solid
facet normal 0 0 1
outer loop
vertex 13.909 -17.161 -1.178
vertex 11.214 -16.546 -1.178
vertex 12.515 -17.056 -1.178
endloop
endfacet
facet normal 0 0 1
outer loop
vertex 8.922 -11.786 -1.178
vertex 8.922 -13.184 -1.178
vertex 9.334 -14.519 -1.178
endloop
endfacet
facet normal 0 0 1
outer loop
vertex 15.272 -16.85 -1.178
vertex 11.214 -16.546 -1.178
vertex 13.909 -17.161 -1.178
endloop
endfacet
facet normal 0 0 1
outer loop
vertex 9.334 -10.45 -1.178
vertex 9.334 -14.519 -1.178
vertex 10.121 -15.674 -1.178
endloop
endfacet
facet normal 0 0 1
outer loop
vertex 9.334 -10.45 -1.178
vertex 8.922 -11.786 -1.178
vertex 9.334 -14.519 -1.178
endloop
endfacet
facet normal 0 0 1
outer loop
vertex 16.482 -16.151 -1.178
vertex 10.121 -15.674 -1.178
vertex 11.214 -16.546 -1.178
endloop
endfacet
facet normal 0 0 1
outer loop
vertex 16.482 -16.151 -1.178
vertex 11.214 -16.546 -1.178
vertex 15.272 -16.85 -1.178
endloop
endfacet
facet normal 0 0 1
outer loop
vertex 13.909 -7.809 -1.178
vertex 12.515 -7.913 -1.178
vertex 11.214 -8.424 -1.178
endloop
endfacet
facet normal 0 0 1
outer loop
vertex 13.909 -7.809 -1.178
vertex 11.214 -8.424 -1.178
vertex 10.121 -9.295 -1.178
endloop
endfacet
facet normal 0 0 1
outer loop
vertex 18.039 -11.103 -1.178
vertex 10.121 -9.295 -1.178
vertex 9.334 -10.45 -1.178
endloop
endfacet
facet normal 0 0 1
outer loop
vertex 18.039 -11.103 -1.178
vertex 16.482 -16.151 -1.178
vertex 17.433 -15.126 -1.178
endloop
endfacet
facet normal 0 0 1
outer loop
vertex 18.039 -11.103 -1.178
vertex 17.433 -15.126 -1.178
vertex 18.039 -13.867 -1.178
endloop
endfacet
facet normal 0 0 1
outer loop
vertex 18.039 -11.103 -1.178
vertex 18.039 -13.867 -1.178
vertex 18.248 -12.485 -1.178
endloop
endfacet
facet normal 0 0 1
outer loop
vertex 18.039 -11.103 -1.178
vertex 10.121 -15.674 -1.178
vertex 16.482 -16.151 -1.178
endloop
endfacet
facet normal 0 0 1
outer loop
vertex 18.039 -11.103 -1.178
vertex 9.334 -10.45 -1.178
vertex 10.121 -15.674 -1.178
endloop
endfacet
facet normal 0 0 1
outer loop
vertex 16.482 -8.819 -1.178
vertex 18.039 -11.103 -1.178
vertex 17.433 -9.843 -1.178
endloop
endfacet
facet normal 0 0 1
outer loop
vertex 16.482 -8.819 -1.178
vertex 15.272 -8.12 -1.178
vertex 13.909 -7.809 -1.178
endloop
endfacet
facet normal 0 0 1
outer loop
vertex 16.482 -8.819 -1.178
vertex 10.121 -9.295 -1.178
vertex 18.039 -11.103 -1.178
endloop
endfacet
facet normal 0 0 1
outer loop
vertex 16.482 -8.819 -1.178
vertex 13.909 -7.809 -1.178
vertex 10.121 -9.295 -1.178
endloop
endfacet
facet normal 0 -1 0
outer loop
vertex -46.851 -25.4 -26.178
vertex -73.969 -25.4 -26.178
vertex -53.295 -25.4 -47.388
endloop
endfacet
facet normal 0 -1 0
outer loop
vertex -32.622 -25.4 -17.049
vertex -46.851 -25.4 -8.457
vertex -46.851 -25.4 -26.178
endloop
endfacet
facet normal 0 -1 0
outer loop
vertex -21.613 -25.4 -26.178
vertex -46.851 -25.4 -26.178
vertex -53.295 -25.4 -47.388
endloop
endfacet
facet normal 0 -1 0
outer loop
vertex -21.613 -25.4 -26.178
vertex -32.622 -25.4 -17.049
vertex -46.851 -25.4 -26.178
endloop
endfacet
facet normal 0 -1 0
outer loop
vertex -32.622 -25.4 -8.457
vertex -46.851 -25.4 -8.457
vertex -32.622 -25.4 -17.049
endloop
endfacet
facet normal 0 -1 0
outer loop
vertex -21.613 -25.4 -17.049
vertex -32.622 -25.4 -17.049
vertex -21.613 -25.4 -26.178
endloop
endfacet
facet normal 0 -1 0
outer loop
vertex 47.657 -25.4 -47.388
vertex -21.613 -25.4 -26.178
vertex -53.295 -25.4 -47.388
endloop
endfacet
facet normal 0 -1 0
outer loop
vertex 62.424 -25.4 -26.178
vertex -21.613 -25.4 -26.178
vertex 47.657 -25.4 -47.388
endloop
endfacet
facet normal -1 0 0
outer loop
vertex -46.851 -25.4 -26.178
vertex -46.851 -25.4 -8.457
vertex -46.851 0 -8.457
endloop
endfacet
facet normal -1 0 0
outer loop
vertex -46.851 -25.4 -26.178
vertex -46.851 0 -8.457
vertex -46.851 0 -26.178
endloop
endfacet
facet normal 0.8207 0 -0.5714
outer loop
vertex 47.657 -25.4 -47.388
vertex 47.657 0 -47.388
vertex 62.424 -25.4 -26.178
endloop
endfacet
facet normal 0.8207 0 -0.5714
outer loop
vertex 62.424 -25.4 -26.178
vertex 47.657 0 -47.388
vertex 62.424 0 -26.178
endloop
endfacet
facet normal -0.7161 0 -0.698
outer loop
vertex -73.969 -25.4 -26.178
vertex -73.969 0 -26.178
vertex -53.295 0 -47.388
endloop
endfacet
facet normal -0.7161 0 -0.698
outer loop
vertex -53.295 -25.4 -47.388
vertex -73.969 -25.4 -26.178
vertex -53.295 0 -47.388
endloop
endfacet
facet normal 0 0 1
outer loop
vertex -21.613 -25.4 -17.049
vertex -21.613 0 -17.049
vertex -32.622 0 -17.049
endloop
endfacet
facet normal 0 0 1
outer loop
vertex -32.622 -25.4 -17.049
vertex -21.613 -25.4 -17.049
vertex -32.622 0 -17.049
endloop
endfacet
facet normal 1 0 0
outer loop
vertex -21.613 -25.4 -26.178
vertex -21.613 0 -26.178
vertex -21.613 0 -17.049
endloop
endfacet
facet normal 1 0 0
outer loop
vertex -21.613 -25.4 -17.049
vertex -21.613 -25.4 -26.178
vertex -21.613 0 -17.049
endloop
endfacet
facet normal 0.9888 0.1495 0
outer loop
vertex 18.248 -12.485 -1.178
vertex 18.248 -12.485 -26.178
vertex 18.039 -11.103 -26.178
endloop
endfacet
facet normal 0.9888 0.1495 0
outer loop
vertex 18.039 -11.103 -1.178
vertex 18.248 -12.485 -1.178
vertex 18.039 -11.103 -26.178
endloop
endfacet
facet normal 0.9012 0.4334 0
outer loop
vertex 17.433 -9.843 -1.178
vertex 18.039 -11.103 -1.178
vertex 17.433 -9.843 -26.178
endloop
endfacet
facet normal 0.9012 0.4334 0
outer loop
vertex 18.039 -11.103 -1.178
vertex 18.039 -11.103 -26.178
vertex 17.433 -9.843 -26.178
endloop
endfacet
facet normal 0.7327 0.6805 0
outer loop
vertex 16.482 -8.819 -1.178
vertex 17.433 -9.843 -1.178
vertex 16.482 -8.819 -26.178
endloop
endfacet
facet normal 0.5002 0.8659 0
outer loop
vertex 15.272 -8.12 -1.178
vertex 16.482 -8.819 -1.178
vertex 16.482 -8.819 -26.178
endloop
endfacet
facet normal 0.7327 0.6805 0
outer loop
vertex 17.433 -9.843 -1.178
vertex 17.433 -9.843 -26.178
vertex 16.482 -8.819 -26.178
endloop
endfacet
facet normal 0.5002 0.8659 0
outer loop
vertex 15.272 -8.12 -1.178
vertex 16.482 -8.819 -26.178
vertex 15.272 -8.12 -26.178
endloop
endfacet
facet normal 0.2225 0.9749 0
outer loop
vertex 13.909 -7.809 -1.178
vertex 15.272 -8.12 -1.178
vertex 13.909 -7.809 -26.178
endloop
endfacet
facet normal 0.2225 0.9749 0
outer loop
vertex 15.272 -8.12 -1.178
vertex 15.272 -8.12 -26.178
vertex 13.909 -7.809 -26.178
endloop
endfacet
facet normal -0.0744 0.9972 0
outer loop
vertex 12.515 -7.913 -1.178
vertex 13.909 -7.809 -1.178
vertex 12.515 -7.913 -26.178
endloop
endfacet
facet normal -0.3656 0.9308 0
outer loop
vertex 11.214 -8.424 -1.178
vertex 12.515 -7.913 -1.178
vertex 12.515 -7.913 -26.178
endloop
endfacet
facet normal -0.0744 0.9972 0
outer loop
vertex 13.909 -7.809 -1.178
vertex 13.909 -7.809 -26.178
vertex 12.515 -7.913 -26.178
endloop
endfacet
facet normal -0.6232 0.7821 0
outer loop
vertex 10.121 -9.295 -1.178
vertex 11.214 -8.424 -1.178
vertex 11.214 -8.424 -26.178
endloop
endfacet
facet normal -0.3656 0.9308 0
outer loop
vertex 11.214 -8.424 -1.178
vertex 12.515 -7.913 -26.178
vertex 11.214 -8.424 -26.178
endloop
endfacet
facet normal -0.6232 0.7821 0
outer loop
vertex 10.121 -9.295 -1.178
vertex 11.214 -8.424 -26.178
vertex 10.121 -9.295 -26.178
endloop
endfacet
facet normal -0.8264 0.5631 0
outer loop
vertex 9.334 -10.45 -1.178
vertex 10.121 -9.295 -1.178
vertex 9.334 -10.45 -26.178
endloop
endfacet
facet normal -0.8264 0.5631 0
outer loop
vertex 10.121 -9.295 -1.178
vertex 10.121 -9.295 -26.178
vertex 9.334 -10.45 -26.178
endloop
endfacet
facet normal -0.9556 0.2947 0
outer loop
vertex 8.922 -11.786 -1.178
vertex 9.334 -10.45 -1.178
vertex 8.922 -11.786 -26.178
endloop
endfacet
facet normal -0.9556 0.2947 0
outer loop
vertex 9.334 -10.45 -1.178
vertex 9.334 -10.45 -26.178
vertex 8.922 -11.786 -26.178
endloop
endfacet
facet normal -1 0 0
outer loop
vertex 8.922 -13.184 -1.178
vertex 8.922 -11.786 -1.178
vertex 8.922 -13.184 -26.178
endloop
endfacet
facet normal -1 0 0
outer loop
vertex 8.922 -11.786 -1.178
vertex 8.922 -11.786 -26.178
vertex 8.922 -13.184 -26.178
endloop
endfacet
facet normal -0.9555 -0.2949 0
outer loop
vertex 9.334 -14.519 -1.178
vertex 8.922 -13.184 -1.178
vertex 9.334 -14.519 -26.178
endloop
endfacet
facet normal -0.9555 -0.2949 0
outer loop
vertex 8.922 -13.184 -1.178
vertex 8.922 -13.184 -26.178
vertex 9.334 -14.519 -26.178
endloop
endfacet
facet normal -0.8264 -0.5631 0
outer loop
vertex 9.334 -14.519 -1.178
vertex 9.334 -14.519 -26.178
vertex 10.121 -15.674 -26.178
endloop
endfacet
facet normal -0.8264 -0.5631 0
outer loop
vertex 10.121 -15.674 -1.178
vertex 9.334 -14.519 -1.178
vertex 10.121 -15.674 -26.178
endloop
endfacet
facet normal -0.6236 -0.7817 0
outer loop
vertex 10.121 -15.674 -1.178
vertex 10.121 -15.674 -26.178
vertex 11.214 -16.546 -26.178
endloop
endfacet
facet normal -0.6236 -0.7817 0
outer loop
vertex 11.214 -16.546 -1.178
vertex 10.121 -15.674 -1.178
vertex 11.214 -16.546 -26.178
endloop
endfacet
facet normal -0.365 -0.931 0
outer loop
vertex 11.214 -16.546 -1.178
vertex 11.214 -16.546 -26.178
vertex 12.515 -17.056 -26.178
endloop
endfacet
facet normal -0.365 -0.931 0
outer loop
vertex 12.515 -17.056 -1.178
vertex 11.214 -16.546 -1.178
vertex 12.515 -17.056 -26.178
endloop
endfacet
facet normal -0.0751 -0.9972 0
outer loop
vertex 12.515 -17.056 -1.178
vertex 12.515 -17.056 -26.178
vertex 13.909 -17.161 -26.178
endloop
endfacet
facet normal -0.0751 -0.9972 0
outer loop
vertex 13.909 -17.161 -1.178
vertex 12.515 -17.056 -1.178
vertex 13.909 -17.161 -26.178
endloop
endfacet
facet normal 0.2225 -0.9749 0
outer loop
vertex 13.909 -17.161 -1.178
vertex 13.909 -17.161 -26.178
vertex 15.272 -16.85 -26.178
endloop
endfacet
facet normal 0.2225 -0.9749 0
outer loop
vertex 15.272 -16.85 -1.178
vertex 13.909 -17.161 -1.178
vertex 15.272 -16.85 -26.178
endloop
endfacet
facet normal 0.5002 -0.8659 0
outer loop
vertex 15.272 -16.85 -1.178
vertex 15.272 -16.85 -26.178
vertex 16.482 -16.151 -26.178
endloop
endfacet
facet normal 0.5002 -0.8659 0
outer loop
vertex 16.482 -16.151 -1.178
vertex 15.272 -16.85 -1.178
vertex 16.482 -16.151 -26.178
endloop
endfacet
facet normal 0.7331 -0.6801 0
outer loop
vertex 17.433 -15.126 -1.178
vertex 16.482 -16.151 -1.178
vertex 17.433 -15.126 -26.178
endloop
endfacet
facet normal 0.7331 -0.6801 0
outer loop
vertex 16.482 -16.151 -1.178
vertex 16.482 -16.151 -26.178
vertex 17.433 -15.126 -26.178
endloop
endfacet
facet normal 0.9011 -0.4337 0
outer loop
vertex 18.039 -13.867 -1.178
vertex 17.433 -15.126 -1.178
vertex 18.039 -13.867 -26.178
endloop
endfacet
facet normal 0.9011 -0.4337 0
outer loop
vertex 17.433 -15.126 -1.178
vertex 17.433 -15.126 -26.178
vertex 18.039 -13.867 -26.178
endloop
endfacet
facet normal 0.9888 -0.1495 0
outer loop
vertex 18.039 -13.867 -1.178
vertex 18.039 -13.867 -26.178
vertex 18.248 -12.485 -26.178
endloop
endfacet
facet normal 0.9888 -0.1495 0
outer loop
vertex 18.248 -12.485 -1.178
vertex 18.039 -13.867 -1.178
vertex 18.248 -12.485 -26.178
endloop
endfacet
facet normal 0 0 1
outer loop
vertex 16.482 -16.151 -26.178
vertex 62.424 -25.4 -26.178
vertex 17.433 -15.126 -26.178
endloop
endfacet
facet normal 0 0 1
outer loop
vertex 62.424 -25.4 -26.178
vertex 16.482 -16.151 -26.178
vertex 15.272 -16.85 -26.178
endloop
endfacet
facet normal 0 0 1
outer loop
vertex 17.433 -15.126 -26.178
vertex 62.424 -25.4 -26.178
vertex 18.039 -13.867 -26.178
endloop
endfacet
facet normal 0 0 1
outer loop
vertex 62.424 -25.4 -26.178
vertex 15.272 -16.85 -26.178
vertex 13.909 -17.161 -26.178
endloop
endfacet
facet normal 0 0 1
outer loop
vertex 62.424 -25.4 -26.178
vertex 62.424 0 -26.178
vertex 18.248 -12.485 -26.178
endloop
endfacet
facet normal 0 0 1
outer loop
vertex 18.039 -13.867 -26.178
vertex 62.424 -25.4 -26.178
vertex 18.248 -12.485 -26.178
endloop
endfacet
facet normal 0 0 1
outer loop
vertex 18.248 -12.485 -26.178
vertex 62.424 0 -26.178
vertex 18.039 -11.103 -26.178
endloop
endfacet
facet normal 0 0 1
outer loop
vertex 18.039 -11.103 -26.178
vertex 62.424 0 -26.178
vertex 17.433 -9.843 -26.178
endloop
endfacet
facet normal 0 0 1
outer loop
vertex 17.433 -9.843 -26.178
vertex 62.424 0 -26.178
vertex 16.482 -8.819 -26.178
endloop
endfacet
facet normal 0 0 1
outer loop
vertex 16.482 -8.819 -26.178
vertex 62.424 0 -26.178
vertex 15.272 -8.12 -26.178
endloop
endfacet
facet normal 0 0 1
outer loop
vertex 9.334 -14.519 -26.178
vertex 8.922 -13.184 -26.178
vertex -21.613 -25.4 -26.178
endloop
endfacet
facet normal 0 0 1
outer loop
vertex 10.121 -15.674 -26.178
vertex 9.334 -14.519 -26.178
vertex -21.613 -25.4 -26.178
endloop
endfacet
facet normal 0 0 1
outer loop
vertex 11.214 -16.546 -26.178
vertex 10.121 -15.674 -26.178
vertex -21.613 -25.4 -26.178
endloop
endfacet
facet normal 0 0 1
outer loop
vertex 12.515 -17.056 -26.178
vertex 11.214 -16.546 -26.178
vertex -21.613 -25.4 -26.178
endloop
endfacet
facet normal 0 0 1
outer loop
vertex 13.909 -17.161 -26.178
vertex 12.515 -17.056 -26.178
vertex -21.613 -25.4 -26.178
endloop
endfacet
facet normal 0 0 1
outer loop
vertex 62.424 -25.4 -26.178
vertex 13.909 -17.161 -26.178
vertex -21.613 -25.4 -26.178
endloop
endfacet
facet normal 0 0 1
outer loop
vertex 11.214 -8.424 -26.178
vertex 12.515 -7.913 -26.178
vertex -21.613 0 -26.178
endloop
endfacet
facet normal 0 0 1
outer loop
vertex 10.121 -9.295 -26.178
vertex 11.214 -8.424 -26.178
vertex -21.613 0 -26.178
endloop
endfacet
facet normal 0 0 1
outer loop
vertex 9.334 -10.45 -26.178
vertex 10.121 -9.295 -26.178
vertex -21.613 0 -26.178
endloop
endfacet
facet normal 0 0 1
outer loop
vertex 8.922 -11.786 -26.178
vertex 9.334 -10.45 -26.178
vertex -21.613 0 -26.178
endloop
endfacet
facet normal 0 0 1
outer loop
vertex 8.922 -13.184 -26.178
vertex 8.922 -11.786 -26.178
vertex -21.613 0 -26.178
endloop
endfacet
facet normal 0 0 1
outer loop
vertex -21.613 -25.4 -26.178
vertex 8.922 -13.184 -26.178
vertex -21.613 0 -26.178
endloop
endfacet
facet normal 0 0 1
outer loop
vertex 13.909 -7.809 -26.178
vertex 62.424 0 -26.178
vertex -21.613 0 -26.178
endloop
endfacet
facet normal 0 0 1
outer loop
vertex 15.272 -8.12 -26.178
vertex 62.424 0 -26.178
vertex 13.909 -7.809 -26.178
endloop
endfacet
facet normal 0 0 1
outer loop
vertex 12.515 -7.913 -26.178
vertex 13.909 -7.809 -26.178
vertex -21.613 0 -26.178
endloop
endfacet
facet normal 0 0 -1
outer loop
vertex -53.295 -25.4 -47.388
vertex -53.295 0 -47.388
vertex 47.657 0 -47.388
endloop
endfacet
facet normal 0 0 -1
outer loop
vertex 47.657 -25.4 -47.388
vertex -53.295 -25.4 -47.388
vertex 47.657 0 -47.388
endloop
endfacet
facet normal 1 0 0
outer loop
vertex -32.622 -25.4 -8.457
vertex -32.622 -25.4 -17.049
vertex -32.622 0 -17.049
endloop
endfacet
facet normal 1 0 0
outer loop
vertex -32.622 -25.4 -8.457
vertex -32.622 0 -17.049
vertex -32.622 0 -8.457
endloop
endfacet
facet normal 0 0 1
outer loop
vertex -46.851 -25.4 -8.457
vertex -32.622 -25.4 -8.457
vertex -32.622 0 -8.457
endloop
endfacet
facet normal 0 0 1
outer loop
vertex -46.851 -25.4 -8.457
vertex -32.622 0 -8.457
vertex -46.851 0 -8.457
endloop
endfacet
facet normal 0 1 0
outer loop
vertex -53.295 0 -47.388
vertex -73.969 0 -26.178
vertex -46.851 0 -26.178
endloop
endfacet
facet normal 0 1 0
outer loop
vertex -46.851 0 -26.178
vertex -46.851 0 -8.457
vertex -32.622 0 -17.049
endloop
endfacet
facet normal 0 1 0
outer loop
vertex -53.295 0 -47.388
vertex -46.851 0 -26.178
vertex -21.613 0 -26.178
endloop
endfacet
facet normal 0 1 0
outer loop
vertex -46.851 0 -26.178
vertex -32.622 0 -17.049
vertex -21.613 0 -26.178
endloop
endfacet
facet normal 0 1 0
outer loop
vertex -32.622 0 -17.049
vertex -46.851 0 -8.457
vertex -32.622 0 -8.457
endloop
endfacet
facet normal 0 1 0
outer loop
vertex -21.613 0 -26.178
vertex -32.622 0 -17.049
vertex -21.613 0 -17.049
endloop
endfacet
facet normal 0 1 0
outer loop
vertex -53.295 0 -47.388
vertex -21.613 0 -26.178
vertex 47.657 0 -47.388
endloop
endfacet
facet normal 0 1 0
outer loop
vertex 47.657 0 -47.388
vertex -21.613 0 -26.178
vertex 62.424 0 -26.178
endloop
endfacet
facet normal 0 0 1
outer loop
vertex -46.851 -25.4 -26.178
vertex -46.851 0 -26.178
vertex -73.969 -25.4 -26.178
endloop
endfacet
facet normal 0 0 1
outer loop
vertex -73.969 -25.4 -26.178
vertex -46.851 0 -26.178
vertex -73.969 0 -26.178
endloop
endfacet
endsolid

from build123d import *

# Parameters (mm, degrees)
F1_DEPTH = 25.4
F2_R     = 4.688974
F4_DEPTH = 25


with BuildPart() as f1:
    # F0 (on Front) → F1 (new body)
    with BuildSketch(Plane.XZ):
        Polygon((-46.851493, -26.17777), (-73.968977, -26.17777), (-53.295251, -47.388475), (47.656961, -47.388475), (62.423911, -26.17777), (13.290253, -26.17777), (0, -26.17777), (-21.61344, -26.17777), align=None)
        Polygon((-46.851493, -8.457433), (-46.851493, -26.17777), (-21.61344, -26.17777), (-21.61344, -17.049111), (-32.621529, -17.049111), (-32.621529, -8.457433), align=None)
    extrude(amount=F1_DEPTH)

    # F2 (on face) → F4 (join)
    with BuildSketch(Plane.XY.offset(-26.17777)):
        with Locations((13.558744, -12.484781)):
            Circle(F2_R)
    extrude(amount=F4_DEPTH)


solid = f1.part
